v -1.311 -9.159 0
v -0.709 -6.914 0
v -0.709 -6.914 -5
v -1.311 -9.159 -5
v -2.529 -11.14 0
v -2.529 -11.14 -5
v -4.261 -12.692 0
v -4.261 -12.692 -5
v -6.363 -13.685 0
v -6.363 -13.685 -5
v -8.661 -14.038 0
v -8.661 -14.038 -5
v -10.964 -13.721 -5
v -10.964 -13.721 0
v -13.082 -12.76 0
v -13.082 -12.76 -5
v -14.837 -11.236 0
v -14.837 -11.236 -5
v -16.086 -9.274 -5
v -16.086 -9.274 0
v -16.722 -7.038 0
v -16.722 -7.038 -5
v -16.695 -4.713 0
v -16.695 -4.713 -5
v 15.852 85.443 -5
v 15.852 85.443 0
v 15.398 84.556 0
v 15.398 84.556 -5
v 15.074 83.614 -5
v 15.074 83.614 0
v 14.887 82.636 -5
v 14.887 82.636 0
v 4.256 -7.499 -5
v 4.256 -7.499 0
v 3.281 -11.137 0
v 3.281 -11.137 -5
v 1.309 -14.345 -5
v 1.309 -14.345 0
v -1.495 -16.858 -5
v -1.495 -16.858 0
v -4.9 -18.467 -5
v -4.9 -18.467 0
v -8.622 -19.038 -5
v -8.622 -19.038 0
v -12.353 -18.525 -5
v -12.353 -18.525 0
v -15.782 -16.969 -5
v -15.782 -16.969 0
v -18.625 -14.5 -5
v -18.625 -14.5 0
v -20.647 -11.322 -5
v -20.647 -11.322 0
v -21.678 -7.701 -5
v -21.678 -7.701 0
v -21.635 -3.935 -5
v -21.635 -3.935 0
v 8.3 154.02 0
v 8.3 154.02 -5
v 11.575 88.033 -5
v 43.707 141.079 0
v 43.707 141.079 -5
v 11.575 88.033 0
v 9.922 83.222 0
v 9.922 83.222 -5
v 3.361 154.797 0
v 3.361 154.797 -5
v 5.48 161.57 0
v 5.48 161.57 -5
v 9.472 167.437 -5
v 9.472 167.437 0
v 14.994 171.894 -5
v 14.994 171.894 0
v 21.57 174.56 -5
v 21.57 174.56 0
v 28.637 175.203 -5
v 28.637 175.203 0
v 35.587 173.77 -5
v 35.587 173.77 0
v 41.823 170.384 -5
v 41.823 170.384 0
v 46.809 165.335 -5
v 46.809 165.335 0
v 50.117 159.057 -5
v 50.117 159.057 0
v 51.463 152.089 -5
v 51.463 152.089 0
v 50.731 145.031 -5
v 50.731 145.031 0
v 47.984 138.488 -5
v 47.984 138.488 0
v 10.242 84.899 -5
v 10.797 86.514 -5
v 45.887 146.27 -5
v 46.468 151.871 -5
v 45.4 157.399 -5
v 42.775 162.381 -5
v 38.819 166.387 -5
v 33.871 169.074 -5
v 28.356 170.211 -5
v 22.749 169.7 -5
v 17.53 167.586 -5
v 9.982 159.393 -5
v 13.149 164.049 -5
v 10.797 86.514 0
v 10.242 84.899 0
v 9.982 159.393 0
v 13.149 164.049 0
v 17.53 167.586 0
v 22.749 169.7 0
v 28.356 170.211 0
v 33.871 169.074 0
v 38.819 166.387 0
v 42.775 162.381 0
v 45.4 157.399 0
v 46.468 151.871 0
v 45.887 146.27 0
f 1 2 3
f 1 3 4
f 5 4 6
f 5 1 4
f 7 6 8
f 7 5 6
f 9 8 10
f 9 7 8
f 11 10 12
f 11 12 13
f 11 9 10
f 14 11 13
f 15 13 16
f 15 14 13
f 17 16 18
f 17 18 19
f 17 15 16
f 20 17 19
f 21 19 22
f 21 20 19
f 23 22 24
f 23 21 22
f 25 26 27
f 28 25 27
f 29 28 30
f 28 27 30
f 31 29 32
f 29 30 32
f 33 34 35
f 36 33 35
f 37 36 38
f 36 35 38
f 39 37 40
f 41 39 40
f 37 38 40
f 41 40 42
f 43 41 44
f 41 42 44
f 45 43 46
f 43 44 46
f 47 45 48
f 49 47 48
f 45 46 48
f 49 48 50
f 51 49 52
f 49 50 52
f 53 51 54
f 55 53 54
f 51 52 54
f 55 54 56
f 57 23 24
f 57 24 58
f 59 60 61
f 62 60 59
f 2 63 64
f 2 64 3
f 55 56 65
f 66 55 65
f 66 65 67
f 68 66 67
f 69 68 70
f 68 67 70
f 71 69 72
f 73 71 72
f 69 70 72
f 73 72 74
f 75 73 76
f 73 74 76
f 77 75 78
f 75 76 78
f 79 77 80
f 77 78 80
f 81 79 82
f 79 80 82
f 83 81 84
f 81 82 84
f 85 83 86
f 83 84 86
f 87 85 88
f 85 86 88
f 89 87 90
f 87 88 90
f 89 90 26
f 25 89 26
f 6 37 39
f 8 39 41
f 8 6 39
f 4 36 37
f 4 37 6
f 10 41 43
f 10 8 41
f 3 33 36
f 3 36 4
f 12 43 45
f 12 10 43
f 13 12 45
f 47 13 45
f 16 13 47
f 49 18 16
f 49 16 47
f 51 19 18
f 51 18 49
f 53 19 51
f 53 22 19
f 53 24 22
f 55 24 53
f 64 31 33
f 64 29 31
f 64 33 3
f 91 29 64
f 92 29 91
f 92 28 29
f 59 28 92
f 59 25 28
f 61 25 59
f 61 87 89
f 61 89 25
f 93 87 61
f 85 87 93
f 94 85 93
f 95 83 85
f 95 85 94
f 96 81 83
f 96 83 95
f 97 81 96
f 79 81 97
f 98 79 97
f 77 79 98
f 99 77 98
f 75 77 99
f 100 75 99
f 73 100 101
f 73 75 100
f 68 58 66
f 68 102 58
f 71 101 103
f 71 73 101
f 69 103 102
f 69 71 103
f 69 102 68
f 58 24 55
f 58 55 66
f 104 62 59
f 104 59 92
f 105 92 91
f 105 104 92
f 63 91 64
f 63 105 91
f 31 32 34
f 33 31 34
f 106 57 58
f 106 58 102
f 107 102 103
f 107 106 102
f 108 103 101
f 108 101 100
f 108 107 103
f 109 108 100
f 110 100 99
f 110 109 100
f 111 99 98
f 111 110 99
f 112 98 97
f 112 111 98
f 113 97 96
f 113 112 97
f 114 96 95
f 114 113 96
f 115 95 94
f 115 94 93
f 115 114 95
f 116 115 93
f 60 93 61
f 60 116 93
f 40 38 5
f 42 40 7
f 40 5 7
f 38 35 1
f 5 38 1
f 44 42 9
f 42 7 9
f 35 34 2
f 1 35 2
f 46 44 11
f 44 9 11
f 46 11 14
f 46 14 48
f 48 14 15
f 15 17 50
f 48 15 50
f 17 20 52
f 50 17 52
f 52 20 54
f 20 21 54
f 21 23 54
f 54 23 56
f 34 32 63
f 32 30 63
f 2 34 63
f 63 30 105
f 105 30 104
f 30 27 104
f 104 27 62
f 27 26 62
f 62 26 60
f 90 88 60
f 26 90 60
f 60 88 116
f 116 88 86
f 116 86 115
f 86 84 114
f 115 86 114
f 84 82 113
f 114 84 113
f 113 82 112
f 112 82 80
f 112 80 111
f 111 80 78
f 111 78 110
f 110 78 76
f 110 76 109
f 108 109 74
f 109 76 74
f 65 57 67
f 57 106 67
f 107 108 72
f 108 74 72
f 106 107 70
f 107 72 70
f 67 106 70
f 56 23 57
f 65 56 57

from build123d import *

# Parameters (mm, degrees)
EXTRUDE_THIN1_DEPTH = 5


with BuildPart() as part:
    # Sketch2 → Extrude-Thin1 (new body)
    with BuildSketch(Plane.XY):
        with BuildLine():
            Line((14.887131394, 82.636077838), (4.256350187, -7.49933382))
            ThreePointArc((4.256350187, -7.49933382), (-10.506003475, -18.916342962), (-21.634589327, -3.93536301))
            Line((-21.634589327, -3.93536301), (3.361011475, 154.797495405))
            ThreePointArc((3.361011475, 154.797495405), (35.58717678, 173.770376713), (47.983576242, 138.488295769))
            Line((47.983576242, 138.488295769), (15.851718131, 85.44288319))
            ThreePointArc((15.851718131, 85.44288319), (15.218957799, 84.091189991), (14.887131394, 82.636077838))
        make_face()
        with BuildLine():
            Line((9.921548726, 83.221730268), (-0.709232481, -6.91368139))
            ThreePointArc((-0.709232481, -6.91368139), (-9.824166991, -13.963051227), (-16.695451446, -4.71312711))
            Line((-16.695451446, -4.71312711), (8.300149356, 154.019731305))
            ThreePointArc((8.300149356, 154.019731305), (33.870766271, 169.074214987), (43.706984101, 141.078809165))
            Line((43.706984101, 141.078809165), (11.575125989, 88.033396586))
            ThreePointArc((11.575125989, 88.033396586), (10.490393993, 85.716208245), (9.921548726, 83.221730268))
        make_face(mode=Mode.SUBTRACT)
    extrude(amount=-EXTRUDE_THIN1_DEPTH)


solid = part.part
